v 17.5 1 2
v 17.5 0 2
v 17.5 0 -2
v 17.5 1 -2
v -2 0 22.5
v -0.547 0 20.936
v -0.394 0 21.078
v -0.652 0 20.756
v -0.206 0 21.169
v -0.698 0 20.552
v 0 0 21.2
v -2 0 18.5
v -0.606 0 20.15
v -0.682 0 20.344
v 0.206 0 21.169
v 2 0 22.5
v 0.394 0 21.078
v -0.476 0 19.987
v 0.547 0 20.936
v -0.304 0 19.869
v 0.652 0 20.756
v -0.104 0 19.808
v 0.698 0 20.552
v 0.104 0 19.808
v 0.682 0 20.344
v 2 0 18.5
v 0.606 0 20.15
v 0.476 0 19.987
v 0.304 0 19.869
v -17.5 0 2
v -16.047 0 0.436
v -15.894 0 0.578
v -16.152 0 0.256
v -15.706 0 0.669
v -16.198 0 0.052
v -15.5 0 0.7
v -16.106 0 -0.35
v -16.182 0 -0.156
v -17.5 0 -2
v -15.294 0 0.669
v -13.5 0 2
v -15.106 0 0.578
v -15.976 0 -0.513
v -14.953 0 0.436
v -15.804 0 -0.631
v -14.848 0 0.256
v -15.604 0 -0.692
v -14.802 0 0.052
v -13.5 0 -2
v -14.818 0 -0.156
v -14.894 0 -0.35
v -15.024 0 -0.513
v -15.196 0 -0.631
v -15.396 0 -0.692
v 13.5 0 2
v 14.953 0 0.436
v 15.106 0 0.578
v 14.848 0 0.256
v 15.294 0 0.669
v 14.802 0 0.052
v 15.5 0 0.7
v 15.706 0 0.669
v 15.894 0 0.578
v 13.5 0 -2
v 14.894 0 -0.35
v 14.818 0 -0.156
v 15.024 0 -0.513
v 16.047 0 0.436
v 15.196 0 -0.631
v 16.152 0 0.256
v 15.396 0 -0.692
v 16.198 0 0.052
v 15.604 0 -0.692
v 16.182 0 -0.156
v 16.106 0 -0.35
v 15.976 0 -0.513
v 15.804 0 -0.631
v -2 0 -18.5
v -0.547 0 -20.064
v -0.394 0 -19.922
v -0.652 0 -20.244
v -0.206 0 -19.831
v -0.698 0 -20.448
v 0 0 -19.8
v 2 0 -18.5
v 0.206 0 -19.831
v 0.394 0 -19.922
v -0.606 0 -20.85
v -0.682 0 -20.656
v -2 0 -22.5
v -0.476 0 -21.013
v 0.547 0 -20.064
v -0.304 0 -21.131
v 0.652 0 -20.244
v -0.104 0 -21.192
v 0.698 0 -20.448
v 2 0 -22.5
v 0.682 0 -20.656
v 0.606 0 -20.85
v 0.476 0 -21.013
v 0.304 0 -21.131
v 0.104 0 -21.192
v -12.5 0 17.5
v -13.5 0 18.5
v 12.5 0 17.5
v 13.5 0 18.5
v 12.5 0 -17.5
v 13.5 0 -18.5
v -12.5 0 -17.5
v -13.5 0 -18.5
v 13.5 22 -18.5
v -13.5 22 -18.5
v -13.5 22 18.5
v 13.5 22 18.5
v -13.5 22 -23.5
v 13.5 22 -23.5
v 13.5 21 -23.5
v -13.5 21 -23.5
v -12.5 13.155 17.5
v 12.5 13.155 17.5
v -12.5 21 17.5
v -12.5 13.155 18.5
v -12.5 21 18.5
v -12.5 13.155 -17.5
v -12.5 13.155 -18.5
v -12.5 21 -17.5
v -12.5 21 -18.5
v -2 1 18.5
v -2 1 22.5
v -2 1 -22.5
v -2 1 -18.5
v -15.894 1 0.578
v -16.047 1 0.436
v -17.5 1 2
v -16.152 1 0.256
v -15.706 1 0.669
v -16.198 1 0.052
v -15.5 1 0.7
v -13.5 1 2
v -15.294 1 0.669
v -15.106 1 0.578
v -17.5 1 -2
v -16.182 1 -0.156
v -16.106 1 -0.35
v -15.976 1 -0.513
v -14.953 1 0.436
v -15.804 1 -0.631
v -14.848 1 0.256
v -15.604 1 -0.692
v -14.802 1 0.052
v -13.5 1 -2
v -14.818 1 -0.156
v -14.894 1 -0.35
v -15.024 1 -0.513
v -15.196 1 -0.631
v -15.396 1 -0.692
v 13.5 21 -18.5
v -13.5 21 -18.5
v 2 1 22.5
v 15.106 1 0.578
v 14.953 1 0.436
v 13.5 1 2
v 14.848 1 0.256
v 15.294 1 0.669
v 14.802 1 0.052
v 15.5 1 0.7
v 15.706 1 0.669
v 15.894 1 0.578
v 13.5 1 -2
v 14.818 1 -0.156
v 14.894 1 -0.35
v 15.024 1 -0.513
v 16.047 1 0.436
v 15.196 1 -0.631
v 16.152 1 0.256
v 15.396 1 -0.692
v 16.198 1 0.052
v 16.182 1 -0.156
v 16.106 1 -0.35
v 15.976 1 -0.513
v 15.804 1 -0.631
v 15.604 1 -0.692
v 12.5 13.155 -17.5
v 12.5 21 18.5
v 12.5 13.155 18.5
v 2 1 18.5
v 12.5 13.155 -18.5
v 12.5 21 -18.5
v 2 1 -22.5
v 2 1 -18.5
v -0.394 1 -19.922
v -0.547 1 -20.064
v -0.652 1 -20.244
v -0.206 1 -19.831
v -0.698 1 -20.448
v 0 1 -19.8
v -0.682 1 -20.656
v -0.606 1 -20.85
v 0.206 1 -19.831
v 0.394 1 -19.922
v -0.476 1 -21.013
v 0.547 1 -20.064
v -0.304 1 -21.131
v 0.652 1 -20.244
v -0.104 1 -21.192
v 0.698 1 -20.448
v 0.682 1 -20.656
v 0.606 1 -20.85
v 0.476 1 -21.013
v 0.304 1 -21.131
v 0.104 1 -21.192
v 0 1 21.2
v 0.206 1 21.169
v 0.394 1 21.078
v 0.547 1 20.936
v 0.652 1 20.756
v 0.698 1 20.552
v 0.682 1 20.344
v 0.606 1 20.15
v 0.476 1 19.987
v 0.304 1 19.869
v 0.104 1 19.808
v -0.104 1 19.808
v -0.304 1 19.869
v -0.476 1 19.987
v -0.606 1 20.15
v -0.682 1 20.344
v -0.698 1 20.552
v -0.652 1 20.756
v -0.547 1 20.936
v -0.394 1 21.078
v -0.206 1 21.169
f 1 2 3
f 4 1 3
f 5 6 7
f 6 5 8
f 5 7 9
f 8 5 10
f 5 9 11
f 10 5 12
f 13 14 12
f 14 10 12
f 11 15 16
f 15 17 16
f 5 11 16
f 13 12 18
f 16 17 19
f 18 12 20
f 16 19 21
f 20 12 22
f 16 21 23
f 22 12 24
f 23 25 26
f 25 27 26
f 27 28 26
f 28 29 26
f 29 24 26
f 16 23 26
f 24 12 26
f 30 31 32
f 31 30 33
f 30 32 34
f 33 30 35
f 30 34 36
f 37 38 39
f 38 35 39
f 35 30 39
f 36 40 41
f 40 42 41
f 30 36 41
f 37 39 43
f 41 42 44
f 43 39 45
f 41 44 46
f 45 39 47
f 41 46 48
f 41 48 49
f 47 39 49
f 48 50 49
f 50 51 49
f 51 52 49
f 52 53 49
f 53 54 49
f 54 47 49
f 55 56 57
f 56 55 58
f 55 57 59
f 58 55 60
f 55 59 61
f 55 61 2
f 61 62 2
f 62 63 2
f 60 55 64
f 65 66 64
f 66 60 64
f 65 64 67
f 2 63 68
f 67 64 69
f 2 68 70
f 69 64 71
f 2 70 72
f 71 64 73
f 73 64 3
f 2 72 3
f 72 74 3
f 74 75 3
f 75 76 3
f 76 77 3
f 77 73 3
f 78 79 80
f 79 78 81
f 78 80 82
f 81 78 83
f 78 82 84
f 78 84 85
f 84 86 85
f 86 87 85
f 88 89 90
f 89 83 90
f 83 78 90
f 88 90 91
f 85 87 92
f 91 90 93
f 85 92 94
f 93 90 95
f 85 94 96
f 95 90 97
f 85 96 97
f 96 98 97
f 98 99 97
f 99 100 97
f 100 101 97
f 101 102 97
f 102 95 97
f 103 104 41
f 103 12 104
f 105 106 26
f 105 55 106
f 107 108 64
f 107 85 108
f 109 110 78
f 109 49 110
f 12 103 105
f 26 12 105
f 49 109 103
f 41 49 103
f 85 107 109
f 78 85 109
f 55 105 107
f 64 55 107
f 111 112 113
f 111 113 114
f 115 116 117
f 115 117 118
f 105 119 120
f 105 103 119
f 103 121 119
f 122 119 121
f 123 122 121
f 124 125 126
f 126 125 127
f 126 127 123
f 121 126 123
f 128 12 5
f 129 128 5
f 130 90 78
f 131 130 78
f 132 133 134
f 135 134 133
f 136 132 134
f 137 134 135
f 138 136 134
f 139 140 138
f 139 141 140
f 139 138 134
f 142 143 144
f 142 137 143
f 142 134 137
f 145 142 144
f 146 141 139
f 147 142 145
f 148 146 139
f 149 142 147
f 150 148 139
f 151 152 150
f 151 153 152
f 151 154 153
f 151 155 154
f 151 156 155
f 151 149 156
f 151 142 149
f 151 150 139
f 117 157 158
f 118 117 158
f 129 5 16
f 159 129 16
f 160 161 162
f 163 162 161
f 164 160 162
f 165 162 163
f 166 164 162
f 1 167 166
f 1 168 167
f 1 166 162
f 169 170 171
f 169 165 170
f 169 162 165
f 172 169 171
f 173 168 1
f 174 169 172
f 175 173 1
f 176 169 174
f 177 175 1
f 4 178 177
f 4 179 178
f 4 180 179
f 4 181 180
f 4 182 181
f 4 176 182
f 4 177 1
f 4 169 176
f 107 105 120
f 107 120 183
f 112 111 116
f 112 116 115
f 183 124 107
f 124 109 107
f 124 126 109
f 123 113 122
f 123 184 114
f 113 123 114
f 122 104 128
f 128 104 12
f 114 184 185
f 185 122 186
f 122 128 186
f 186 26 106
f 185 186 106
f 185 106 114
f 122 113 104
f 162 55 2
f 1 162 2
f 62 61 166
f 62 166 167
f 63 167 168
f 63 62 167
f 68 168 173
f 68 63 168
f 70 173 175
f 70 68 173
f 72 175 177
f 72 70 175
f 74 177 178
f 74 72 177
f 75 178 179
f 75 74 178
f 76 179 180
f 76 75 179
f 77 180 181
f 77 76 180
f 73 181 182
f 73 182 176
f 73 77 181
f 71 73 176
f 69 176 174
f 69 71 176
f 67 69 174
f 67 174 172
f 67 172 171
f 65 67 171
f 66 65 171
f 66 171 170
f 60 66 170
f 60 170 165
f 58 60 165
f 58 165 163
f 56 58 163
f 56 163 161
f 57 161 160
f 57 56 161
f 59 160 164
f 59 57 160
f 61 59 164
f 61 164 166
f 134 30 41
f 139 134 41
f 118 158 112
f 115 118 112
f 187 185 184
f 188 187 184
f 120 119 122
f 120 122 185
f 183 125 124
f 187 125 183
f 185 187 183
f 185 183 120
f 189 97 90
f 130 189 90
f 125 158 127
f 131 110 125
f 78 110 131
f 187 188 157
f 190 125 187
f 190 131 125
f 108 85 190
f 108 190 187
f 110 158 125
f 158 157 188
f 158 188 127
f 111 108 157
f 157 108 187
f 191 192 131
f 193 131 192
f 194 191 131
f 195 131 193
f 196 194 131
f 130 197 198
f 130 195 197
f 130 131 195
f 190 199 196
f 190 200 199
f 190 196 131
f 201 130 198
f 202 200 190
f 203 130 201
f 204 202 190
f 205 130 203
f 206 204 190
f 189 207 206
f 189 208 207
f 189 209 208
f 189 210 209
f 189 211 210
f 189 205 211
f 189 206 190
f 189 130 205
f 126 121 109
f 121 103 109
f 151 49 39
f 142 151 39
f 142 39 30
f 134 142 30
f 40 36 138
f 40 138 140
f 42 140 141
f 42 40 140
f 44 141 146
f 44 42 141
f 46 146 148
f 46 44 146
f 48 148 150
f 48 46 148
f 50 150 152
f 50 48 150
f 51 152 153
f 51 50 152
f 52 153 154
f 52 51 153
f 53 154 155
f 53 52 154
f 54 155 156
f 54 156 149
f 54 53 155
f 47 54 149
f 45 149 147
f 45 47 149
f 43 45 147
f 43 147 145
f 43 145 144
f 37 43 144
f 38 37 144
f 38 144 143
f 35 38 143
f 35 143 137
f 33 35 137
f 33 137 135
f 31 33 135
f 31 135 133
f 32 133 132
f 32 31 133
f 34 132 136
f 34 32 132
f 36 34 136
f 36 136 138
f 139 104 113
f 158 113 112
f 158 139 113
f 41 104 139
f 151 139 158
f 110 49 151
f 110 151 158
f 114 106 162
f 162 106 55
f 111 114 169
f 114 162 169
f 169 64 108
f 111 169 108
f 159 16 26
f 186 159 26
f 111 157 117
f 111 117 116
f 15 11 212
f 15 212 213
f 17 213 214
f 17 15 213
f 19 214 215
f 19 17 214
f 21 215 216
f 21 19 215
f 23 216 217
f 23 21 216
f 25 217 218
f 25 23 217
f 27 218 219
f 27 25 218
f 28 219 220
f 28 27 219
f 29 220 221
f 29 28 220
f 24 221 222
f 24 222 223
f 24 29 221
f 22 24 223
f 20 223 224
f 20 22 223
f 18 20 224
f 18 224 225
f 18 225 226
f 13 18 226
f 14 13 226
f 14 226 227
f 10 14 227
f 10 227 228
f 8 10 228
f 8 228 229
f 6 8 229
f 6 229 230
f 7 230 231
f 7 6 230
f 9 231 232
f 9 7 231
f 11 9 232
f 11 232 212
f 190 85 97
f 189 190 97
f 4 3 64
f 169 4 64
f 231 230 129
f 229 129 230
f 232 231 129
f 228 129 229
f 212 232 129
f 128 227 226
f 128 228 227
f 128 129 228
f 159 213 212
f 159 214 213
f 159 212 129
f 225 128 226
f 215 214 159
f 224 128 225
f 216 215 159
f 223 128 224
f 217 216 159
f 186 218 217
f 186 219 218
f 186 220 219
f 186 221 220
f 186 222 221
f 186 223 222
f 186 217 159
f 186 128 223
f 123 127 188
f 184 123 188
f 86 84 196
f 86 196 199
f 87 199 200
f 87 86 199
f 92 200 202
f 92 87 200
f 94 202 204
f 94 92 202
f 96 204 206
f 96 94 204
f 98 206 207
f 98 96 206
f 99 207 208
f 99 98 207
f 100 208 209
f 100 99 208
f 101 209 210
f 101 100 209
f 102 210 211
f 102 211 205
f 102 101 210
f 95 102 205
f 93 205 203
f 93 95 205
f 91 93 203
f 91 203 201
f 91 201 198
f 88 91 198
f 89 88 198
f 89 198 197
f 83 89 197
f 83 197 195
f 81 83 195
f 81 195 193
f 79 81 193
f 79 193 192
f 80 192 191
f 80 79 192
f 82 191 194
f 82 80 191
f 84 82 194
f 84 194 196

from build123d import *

# Parameters (mm, degrees)
SKETCH_1_R               = 0.7
SKETCH_1_W               = 25
SKETCH_1_H               = 35
EXTRUDE_1_DEPTH          = 1
SKETCH_3_W               = 27
SKETCH_3_H               = 37
SKETCH_3_W_2             = 25
SKETCH_3_H_2             = 35
EXTRUDE_2_DEPTH          = 20
SKETCH_4_W               = 27
SKETCH_4_H               = 37
EXTRUDE_3_DEPTH          = 1
CUT_EXTRUDE_1_DEPTH      = 37.006943775
CUT_EXTRUDE_1_DEPTH_BACK = 37.006943775
SKETCH_5_W               = 25.000009511
SKETCH_5_H               = 7.845312142
SKETCH_6_W               = 27.00004857
SKETCH_6_H               = 0.999781596
EXTRUDE_4_DEPTH          = 5


with BuildPart() as part:
    # 草图1 → 凸台-拉伸1 (new body)
    with BuildSketch(Plane(origin=(0, 0, 0), x_dir=(1, 0, 0), z_dir=(0, 1, 0))):
        Polygon((-13.5, -2), (-13.5, -18.5), (-2, -18.5), (-2, -22.5), (2, -22.5), (2, -18.5), (13.5, -18.5), (13.5, -2), (17.5, -2), (17.5, 2), (13.5, 2), (13.5, 18.5), (2, 18.5), (2, 22.5), (-2, 22.5), (-2, 18.5), (-13.5, 18.5), (-13.5, 2), (-17.5, 2), (-17.5, -2), align=None)
        with Locations(Location((-15.5, 0, 0), (0, 0, 270))):
            Circle(SKETCH_1_R, mode=Mode.SUBTRACT)
        with Locations(Location((15.5, 0, 0), (0, 0, 270))):
            Circle(SKETCH_1_R, mode=Mode.SUBTRACT)
        with Locations(Location((0, 20.5, 0), (0, 0, 270))):
            Circle(SKETCH_1_R, mode=Mode.SUBTRACT)
        with Locations(Location((0, -20.5, 0), (0, 0, 270))):
            Circle(SKETCH_1_R, mode=Mode.SUBTRACT)
        Rectangle(SKETCH_1_W, SKETCH_1_H, mode=Mode.SUBTRACT)
    extrude(amount=EXTRUDE_1_DEPTH)

    # 草图3 → 凸台-拉伸2 (add)
    with BuildSketch(Plane(origin=(0, 1, 0), x_dir=(1, 0, 0), z_dir=(0, 1, 0))):
        Rectangle(SKETCH_3_W, SKETCH_3_H)
        Rectangle(SKETCH_3_W_2, SKETCH_3_H_2, mode=Mode.SUBTRACT)
    extrude(amount=EXTRUDE_2_DEPTH)

    # 草图4 → 凸台-拉伸3 (add)
    with BuildSketch(Plane(origin=(0, 21, 0), x_dir=(1, 0, 0), z_dir=(0, 1, 0))):
        Rectangle(SKETCH_4_W, SKETCH_4_H)
    extrude(amount=EXTRUDE_3_DEPTH)

    # 草图5 → 切除-拉伸1 (cut, two sides: drawn at the far end of the back side and taken through both)
    with BuildSketch(Plane.XY.offset(-CUT_EXTRUDE_1_DEPTH_BACK)):
        with Locations((2.6183e-05, 17.077384412)):
            Rectangle(SKETCH_5_W, SKETCH_5_H)
    extrude(amount=CUT_EXTRUDE_1_DEPTH + CUT_EXTRUDE_1_DEPTH_BACK, mode=Mode.SUBTRACT)

    # 草图6 → 凸台-拉伸4 (add)
    with BuildSketch(Plane(origin=(0, 0, -18.5), x_dir=(-1, 0, 0), z_dir=(0, 0, -1))):
        with Locations((2.5906e-05, 21.500116927)):
            Rectangle(SKETCH_6_W, SKETCH_6_H)
    extrude(amount=EXTRUDE_4_DEPTH)


solid = part.part
